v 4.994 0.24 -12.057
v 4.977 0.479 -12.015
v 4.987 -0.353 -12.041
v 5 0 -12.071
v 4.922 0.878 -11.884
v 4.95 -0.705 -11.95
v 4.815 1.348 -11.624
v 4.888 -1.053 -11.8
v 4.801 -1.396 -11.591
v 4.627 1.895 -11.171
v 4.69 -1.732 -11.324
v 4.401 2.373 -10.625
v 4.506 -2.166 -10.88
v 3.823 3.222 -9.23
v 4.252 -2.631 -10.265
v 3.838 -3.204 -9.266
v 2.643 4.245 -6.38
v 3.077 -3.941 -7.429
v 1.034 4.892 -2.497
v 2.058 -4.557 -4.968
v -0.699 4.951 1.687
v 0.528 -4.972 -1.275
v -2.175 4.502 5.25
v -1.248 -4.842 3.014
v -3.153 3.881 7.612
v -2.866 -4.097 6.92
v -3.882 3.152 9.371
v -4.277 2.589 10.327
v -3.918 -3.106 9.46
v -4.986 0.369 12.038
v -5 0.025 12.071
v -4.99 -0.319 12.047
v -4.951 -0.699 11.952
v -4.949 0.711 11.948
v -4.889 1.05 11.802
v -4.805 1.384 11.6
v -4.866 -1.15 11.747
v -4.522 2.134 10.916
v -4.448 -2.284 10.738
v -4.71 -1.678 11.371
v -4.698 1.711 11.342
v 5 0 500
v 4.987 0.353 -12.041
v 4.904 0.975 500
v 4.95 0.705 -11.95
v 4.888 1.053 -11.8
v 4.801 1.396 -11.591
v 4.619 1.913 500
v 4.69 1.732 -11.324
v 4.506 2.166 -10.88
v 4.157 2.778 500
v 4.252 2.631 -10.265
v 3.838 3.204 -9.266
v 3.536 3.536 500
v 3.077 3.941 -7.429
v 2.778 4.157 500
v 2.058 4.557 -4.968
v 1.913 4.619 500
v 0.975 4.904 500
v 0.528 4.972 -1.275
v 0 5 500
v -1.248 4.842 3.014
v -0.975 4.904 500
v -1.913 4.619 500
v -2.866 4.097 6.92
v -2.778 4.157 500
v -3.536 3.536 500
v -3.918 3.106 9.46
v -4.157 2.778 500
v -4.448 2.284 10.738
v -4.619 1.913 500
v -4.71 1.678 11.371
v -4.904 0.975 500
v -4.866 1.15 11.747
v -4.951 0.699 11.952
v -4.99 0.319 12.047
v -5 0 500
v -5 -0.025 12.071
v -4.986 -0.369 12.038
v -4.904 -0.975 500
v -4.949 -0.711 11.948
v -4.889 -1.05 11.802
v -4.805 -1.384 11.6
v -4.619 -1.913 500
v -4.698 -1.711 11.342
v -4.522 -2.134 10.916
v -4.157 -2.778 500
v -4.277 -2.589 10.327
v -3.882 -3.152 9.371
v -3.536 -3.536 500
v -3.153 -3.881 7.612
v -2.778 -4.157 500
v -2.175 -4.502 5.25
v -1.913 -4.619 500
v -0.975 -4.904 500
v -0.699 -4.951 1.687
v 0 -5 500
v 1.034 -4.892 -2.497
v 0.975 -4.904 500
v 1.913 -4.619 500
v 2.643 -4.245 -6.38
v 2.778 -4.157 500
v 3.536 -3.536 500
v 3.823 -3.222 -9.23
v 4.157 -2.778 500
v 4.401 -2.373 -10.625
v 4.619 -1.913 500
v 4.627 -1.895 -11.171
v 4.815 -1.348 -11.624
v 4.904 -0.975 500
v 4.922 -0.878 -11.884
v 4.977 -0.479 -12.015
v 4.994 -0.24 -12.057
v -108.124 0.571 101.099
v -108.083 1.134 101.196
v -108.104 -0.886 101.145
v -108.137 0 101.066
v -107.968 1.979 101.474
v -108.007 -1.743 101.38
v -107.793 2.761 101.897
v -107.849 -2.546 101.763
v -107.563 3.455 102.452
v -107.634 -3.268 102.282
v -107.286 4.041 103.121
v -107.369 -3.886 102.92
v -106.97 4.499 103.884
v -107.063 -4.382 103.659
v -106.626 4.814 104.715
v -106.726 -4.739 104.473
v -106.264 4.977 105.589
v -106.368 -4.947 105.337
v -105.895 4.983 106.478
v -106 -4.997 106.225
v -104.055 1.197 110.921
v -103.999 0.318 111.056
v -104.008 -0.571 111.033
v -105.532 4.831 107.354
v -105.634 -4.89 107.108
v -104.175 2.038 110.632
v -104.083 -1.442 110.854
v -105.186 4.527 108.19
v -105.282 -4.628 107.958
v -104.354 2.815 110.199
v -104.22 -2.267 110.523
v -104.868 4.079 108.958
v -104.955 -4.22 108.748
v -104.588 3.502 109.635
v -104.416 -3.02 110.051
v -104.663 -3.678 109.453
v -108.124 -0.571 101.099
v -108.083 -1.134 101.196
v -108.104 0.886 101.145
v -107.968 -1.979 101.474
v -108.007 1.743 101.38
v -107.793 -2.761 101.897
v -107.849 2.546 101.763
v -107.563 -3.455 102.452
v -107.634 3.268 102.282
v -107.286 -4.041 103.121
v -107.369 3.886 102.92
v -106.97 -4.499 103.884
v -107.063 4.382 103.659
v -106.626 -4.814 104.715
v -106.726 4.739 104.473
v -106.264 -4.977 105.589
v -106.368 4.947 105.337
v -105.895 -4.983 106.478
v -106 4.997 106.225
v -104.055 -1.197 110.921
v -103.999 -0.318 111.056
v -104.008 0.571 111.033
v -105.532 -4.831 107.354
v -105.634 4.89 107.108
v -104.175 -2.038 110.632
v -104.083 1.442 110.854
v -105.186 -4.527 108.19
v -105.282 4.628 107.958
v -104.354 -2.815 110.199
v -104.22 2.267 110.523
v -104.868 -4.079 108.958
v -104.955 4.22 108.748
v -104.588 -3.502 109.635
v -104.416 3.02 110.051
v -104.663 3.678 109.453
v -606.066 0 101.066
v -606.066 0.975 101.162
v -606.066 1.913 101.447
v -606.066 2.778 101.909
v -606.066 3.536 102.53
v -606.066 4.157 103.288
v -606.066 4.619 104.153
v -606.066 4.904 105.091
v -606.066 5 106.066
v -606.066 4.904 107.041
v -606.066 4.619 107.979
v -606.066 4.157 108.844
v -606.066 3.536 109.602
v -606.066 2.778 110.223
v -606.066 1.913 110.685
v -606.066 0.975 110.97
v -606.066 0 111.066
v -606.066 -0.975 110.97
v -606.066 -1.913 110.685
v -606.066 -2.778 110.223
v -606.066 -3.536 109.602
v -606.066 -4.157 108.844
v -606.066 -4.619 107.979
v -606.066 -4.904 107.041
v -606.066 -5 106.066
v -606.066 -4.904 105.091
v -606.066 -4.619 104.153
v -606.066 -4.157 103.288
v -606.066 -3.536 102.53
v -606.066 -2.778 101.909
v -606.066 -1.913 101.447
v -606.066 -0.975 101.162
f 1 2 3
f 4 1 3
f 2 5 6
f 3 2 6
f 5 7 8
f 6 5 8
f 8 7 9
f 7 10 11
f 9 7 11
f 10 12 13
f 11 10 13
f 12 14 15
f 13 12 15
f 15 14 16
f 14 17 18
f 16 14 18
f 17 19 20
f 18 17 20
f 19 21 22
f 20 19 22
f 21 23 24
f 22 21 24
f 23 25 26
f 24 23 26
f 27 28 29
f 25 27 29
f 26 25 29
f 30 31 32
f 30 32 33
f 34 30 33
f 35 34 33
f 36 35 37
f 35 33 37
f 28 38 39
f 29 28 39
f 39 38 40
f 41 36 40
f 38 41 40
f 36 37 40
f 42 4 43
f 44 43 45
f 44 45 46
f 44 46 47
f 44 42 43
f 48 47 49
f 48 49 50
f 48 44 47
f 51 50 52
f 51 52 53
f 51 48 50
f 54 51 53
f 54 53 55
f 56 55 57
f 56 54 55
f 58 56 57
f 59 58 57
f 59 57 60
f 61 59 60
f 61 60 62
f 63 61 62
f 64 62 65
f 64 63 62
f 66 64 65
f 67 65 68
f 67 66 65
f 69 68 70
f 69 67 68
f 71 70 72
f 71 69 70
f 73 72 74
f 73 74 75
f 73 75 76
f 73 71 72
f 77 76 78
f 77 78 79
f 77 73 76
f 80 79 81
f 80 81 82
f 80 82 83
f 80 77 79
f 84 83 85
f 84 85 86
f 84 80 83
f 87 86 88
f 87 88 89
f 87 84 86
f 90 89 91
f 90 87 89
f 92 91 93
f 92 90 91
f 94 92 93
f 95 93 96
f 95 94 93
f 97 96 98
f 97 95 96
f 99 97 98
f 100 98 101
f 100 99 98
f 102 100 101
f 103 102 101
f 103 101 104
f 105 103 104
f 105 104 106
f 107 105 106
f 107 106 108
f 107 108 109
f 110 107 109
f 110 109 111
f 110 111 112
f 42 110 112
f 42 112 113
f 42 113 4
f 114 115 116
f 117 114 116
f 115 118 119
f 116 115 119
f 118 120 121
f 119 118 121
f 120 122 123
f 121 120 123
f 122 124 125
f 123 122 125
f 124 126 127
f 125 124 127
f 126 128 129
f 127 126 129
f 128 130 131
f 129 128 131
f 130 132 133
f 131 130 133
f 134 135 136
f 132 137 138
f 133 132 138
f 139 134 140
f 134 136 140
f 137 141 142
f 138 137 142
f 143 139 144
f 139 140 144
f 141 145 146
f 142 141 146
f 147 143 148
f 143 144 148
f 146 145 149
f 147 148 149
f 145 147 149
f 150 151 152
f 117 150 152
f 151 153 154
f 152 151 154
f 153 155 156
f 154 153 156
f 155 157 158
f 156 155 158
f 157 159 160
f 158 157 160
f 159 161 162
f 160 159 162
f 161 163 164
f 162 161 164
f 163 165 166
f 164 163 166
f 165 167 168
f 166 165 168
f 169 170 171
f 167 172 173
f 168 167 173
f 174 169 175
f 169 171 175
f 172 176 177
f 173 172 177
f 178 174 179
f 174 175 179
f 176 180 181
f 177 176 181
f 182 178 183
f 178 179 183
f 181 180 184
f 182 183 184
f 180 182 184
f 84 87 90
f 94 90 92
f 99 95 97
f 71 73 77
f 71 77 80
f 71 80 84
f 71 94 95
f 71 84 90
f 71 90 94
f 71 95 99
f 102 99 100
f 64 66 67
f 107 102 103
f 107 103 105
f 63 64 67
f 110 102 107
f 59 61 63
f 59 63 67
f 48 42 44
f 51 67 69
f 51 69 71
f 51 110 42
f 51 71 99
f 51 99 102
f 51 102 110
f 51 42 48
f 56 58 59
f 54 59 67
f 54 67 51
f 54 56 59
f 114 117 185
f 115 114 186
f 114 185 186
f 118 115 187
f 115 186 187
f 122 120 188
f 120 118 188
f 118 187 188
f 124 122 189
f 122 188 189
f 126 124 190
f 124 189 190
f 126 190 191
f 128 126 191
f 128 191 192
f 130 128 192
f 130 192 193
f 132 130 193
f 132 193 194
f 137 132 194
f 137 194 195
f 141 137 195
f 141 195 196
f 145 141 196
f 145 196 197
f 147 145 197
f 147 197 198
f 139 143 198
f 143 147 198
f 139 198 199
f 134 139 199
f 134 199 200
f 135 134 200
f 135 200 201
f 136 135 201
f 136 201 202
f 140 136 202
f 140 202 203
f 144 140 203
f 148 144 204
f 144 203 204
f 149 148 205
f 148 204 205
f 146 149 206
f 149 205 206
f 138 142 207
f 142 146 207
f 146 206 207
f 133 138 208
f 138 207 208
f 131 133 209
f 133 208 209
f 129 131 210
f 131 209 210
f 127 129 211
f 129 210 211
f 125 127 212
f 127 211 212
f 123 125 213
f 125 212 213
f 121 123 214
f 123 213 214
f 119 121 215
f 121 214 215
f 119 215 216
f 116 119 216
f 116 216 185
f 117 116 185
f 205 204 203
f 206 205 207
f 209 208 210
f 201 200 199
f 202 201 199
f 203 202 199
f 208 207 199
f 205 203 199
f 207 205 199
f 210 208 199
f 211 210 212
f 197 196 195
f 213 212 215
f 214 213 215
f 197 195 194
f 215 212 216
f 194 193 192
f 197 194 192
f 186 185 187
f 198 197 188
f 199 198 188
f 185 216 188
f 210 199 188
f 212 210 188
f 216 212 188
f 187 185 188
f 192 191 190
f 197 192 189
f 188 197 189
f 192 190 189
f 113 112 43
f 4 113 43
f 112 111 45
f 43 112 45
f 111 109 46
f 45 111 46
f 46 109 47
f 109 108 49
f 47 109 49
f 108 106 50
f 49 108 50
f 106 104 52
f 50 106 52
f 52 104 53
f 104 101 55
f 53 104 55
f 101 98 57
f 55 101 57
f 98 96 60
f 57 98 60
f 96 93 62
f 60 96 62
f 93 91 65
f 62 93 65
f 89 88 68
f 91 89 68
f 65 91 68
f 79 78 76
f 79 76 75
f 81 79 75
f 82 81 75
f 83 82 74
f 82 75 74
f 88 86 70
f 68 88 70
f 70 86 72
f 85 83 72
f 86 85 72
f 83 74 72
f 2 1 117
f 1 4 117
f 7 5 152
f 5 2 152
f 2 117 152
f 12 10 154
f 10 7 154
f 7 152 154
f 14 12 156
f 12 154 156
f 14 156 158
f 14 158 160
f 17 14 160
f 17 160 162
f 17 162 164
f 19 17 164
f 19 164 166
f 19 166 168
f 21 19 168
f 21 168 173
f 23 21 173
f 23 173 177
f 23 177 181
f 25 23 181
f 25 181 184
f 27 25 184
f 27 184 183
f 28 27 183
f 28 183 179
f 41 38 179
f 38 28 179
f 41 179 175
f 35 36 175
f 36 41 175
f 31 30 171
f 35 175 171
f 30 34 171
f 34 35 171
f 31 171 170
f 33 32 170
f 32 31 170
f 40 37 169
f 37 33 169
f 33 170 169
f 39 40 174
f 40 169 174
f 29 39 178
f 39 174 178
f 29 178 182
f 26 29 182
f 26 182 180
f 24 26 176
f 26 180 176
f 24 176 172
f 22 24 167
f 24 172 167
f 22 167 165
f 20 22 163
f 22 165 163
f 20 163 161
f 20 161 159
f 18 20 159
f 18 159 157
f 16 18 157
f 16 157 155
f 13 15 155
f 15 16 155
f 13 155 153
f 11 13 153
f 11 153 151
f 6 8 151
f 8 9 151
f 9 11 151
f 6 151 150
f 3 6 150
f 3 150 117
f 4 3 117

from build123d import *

# Parameters (mm, degrees)
SKETCH1_ON_SEGMENT_1_R                 = 5
ROUND_RODS_ROUND_BAR_10_2_DEPTH        = 503.928932188
SKETCH1_ON_SEGMENT_2_R                 = 5
ROUND_RODS_ROUND_BAR_10_2_2_DEPTH      = 172
SKETCH1_R                              = 5
ROUND_RODS_ROUND_BAR_10_2_3_DEPTH      = 500
ROUND_RODS_ROUND_BAR_10_2_3_DEPTH_BACK = 18.071067812


with BuildPart() as part:
    # Sketch1 on segment 1 (carried to segment 1) → Round-rods ROUND BAR 10(2) (new body)
    with BuildSketch(Plane(origin=(-606.066017178, 0, 106.066017178), x_dir=(0, 0, -1), z_dir=(1, 0, 0))):
        Circle(SKETCH1_ON_SEGMENT_1_R)
    extrude(amount=ROUND_RODS_ROUND_BAR_10_2_DEPTH)

    # Round-rods ROUND BAR 10(2) mitre 1
    split(bisect_by=Plane(origin=(-106.066017178, 0, 106.066017178), x_dir=(0, -1, 0), z_dir=(-0.923879533, 0, 0.382683432)), keep=Keep.TOP)


with BuildPart() as body_2:
    # Sketch1 on segment 2 (carried to segment 2) → Round-rods ROUND BAR 10_2 2 (new body)
    with BuildSketch(Plane(origin=(-108.844191771, 0, 108.844191771), x_dir=(-0.707106781, 0, -0.707106781), z_dir=(0.707106781, 0, -0.707106781))):
        Circle(SKETCH1_ON_SEGMENT_2_R)
    extrude(amount=ROUND_RODS_ROUND_BAR_10_2_2_DEPTH)

    # Round-rods ROUND BAR 10_2 2 mitre 1
    split(bisect_by=Plane(origin=(0, 0, 0), x_dir=(0, -1, 0), z_dir=(-0.923879533, 0, -0.382683432)), keep=Keep.TOP)

    # Round-rods ROUND BAR 10_2 2 mitre 2
    split(bisect_by=Plane(origin=(-106.066017178, 0, 106.066017178), x_dir=(0, 1, 0), z_dir=(0.923879533, 0, -0.382683432)), keep=Keep.TOP)


with BuildPart() as body_3:
    # Sketch1 → Round-rods ROUND BAR 10_2 3 (new, two sides)
    with BuildSketch(Plane.XY) as round_rods_round_bar_10_2_3_sk:
        Circle(SKETCH1_R)
    extrude(amount=ROUND_RODS_ROUND_BAR_10_2_3_DEPTH)
    extrude(round_rods_round_bar_10_2_3_sk.sketch, amount=-ROUND_RODS_ROUND_BAR_10_2_3_DEPTH_BACK)

    # Round-rods ROUND BAR 10_2 3 mitre 1
    split(bisect_by=Plane(origin=(0, 0, 0), x_dir=(0, 1, 0), z_dir=(0.923879533, 0, 0.382683432)), keep=Keep.TOP)


solid = Compound([part.part, body_2.part, body_3.part])
